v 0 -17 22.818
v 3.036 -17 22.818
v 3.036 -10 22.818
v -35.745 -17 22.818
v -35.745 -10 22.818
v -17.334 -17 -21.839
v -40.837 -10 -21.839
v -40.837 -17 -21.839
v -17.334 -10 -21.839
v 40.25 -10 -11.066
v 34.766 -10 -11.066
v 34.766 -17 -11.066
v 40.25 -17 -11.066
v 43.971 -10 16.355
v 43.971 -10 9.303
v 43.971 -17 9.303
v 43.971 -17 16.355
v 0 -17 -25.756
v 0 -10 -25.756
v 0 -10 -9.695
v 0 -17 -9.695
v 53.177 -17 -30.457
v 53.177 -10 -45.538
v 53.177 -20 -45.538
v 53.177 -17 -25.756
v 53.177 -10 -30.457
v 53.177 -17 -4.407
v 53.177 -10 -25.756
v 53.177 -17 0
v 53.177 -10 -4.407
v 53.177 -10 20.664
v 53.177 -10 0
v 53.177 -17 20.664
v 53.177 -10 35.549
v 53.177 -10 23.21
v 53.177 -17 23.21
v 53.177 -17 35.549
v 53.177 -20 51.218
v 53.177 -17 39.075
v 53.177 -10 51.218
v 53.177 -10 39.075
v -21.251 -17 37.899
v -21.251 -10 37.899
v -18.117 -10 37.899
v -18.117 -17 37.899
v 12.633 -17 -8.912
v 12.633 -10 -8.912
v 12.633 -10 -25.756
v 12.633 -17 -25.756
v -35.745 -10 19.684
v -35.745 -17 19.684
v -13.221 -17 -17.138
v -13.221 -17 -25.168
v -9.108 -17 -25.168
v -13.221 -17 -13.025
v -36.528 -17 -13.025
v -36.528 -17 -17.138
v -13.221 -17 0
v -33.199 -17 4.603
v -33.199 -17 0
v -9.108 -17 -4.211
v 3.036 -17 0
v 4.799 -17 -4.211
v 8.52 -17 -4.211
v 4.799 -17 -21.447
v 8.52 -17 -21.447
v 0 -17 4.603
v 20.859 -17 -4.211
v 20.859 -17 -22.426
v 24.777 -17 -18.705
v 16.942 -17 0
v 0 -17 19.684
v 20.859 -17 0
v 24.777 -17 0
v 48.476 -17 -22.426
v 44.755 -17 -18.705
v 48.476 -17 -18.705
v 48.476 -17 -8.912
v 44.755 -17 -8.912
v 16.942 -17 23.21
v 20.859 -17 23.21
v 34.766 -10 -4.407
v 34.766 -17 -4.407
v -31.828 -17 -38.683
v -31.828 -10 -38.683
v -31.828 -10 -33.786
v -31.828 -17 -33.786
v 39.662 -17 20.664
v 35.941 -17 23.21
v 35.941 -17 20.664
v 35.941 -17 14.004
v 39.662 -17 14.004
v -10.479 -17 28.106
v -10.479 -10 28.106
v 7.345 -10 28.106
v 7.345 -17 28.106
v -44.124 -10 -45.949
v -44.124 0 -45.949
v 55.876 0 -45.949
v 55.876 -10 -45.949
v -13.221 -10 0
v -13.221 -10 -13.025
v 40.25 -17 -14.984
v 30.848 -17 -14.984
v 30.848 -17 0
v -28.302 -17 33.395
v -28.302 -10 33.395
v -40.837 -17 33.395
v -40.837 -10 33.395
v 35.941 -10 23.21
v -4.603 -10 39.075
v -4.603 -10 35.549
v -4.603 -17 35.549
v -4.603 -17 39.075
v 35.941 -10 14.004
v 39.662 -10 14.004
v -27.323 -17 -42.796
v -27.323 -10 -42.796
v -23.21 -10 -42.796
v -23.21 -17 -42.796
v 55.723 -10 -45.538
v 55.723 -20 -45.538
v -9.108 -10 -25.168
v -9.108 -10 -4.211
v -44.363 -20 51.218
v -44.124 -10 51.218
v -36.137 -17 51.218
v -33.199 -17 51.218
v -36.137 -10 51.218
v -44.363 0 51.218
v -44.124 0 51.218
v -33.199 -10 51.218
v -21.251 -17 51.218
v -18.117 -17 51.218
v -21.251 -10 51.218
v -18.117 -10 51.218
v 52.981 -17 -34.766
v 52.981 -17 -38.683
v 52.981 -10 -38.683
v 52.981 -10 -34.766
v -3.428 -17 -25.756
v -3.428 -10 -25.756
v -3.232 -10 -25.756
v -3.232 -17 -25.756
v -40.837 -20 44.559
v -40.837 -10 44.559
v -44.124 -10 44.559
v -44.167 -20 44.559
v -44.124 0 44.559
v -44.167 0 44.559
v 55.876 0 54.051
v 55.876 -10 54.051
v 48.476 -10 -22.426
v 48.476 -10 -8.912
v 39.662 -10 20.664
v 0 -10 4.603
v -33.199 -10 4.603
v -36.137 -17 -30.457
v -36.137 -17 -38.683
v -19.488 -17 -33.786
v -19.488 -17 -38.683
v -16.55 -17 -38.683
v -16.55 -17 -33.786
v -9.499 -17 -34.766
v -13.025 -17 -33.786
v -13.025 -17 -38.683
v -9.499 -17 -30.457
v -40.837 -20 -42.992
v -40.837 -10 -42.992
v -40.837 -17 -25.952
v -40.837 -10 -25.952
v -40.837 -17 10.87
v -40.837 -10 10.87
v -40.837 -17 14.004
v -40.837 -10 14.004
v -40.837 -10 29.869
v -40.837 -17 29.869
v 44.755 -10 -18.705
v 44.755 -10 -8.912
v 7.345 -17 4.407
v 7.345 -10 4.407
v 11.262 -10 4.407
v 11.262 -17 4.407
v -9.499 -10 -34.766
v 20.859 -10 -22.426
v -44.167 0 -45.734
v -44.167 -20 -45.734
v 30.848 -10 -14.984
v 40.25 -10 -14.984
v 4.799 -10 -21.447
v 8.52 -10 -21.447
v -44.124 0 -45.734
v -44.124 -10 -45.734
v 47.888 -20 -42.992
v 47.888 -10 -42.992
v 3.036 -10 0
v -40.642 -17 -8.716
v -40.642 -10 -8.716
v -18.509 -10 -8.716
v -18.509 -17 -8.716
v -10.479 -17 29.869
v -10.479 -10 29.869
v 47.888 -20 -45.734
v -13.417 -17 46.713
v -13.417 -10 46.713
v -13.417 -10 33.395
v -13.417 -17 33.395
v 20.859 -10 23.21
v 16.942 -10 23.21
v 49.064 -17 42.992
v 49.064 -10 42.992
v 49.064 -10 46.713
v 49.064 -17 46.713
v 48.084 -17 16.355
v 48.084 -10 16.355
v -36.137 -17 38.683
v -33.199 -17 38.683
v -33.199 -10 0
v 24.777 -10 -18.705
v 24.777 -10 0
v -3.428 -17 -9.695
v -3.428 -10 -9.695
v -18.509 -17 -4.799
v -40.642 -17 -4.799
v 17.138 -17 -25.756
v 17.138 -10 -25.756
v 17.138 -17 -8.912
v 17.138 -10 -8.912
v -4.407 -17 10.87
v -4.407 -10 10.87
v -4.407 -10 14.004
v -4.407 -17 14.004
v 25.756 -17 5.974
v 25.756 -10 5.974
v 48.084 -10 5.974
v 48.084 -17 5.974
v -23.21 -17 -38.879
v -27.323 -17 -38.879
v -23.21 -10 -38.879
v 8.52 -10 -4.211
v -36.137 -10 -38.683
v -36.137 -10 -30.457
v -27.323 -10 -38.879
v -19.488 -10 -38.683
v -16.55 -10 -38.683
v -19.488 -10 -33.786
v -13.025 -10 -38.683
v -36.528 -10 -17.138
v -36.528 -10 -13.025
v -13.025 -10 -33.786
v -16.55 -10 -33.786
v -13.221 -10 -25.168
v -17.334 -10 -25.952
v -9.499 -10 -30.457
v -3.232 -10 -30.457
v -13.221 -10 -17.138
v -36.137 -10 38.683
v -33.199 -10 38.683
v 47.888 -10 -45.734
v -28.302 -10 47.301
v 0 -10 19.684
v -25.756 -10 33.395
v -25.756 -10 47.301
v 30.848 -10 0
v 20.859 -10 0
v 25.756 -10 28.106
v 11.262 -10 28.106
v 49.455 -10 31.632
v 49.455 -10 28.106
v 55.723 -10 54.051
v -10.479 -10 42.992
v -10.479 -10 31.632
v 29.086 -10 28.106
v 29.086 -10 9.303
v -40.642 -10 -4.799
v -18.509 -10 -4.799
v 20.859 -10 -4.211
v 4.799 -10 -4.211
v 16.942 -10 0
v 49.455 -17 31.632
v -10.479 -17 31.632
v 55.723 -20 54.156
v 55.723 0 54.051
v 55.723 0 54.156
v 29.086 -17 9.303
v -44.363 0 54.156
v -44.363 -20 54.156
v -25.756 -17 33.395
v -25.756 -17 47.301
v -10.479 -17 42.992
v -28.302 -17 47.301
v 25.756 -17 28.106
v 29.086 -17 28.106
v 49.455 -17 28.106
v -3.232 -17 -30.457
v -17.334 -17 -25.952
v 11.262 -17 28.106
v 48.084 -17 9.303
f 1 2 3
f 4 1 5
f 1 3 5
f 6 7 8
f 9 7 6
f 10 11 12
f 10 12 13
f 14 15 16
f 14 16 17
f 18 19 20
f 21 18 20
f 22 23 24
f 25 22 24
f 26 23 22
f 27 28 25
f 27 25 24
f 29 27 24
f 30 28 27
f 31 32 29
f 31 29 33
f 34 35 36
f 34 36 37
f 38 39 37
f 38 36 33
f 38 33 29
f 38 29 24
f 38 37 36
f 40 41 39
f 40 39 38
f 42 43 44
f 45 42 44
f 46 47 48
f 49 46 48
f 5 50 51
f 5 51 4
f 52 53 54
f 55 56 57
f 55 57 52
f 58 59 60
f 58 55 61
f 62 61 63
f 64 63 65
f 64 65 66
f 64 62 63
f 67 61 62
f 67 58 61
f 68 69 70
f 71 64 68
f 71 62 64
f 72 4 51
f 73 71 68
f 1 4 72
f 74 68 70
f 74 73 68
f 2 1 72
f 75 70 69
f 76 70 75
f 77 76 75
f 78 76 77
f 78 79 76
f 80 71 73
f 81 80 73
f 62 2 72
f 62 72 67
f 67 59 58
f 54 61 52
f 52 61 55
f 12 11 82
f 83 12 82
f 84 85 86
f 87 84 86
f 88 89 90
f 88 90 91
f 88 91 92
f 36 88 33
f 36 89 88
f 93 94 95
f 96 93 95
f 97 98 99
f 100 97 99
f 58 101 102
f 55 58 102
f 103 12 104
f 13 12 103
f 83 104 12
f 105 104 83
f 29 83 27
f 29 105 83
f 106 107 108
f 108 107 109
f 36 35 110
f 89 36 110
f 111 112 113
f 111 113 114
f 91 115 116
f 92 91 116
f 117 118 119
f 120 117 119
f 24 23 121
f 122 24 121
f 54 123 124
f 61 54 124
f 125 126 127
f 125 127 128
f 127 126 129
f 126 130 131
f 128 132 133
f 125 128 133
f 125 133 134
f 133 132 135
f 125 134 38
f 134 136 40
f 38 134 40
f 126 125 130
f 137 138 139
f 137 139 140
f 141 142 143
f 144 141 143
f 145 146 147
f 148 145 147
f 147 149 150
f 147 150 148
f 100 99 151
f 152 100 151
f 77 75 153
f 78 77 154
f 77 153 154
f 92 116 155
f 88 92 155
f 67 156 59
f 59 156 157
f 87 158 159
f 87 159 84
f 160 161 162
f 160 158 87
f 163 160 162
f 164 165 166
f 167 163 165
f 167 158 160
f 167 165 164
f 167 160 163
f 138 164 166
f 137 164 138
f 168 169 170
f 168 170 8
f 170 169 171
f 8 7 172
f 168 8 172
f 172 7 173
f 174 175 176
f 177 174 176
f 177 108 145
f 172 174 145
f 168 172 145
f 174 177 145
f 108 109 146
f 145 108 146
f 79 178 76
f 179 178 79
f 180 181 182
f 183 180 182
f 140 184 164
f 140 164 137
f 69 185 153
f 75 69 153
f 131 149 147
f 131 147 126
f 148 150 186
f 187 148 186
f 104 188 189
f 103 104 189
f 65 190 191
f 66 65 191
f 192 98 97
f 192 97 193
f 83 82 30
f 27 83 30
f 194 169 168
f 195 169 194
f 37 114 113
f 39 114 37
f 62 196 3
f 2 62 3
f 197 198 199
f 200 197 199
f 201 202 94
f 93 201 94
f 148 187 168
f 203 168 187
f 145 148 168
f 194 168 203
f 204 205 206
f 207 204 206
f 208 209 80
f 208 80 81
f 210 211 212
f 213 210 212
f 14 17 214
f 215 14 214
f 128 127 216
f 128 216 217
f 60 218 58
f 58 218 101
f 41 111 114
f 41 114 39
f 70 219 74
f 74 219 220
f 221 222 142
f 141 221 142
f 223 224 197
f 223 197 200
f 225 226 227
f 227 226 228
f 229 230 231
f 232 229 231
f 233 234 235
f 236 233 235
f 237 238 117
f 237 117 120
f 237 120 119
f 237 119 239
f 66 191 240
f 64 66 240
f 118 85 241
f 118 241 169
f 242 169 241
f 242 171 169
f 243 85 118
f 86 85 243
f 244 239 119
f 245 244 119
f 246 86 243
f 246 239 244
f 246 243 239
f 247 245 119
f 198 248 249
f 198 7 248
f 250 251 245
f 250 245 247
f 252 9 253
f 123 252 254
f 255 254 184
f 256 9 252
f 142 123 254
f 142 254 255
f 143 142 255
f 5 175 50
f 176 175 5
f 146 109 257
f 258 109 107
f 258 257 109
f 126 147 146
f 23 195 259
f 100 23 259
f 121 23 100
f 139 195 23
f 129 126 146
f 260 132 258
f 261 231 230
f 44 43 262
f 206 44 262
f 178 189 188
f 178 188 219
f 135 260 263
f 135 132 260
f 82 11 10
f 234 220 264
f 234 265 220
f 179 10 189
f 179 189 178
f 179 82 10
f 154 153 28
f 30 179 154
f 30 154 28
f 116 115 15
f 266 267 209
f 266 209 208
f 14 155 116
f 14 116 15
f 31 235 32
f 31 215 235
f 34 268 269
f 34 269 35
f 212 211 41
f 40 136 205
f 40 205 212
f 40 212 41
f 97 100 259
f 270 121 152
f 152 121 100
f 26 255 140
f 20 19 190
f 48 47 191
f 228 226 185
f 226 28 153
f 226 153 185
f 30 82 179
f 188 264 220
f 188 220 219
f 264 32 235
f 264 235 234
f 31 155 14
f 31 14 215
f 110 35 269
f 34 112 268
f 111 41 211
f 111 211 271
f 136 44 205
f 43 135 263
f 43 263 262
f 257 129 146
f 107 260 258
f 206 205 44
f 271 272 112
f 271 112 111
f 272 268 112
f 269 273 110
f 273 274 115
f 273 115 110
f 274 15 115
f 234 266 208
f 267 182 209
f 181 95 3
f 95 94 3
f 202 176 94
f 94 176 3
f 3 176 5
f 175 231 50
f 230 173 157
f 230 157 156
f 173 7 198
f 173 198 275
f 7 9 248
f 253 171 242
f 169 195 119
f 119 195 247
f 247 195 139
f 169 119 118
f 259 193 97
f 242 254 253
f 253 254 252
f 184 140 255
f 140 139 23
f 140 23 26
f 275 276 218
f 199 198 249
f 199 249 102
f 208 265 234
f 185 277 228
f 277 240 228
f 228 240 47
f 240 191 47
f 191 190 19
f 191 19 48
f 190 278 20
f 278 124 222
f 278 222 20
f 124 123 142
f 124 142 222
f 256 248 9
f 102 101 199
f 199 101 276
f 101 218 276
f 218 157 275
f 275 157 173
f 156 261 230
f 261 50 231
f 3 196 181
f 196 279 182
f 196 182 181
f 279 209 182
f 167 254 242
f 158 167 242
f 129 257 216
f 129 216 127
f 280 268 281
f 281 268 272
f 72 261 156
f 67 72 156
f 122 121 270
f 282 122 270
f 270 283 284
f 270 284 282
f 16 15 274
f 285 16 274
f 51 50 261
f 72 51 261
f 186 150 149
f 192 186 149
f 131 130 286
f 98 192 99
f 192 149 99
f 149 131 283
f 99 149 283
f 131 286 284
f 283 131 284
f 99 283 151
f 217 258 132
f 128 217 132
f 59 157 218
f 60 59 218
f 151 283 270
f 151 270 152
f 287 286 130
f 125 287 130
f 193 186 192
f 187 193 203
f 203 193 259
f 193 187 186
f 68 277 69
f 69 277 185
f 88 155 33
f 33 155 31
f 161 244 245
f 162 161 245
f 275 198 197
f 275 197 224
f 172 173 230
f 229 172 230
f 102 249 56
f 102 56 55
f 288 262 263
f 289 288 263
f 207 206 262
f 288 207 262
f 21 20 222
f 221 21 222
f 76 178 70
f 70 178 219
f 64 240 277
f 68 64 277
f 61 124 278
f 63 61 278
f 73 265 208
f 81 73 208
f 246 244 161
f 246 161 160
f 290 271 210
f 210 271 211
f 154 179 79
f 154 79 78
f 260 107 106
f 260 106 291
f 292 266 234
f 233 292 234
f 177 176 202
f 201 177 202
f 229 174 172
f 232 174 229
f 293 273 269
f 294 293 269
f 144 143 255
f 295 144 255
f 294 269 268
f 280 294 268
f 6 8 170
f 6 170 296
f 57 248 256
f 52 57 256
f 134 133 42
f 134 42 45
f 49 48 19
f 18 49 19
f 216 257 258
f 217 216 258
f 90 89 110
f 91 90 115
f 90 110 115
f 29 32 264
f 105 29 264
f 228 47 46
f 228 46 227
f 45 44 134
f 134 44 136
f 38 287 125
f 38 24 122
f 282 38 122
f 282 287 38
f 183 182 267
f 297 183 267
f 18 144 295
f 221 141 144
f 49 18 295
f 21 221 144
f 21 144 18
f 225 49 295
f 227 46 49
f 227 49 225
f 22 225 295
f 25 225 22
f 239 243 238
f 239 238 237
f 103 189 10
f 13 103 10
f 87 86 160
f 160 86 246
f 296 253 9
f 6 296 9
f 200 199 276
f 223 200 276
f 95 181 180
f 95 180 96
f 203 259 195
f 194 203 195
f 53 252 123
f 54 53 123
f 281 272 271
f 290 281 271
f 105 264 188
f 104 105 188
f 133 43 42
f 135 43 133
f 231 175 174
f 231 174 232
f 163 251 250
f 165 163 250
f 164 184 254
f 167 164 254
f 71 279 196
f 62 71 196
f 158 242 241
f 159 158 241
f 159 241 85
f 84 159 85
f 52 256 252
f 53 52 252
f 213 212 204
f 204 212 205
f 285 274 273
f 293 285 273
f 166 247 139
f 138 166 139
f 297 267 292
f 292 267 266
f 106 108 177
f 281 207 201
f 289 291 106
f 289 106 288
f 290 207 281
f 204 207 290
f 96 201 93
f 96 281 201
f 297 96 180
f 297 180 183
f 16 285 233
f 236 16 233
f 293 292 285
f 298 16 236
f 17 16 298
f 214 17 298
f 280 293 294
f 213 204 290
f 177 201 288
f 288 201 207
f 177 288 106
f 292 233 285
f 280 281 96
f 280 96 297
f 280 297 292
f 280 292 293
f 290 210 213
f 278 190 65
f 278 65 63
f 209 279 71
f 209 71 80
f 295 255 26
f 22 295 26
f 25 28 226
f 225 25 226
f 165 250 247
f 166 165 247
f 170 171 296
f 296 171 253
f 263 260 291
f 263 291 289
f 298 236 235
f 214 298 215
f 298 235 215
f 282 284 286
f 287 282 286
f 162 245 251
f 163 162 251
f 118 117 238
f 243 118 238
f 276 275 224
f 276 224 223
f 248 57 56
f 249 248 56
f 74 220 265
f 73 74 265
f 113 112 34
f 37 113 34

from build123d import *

# Parameters (mm, degrees)
F0_W     = 100
F0_H     = 100
F3_DEPTH = 10
F1_W     = 2.5462172925
F1_H     = 96.7562794685
F1_W_2   = 88.7259021401
F1_H_2   = 2.7420781553
F4_DEPTH = 20
F2_W     = 2.9379464686
F2_H     = 12.5352256
F2_W_2   = 2.5462172925
F2_H_2   = 13.9062739909
F2_W_3   = 3.9172582328
F2_H_3   = 23.699412588
F2_W_4   = 59.5423225313
F2_H_4   = 3.7213973701
F2_W_5   = 4.1131153703
F2_H_5   = 7.0510646328
F2_W_6   = 3.1338073313
F2_H_6   = 13.3186765015
F2_W_7   = 57.7795598656
F2_H_7   = 3.5255327821
F2_W_8   = 3.7213899195
F2_H_8   = 6.6593382508
F2_W_9   = 5.4841600358
F2_H_9   = 3.9172582328
F2_H_10  = 23.2097543776
F2_H_11  = 9.7931455821
F2_W_10  = 3.7213945761
F2_H_12  = 17.2359370627
F2_W_11  = 35.7449837029
F2_H_13  = 3.1338054687
F2_W_12  = 23.3076885343
F2_H_14  = 4.1131218895
F2_W_13  = 4.504846409
F2_H_15  = 16.8442111462
F2_W_14  = 62.480266206
F2_W_15  = 2.9379427433
F2_H_16  = 4.8965737224
F2_W_16  = 4.3089836836
F2_W_17  = 36.4305013791
F2_H_17  = 3.1338064
F2_W_18  = 22.1325084567
F2_W_19  = 23.503549397
F2_H_18  = 4.1131190956
F2_W_20  = 4.1131209582
F5_DEPTH = 17


with BuildPart() as f3:
    # F0 (on Front) → F3 (new body)
    with BuildSketch(Plane.XZ):
        with Locations((5.8758892119, 4.0513307203)):
            Rectangle(F0_W, F0_H)
    extrude(amount=F3_DEPTH)

    # F1 (on face) → F4 (join)
    with BuildSketch(Plane.XZ):
        Polygon((55.7230003178, 54.1560947895), (-44.3629510701, 54.1560947895), (-44.3629510701, 51.2181520462), (53.1767830253, 51.2181520462), (55.7230003178, 51.2181520462), align=None)
        with Locations((54.4498916715, 2.8400123119)):
            Rectangle(F1_W, F1_H)
        Polygon((-44.167086482, 44.5588119328), (-44.167086482, -45.7339882851), (-40.837418288, -45.7339882851), (-40.837418288, -42.9919101298), (-40.837418288, 44.5588119328), align=None)
        with Locations((3.5255327821, -44.3629492074)):
            Rectangle(F1_W_2, F1_H_2)
    extrude(amount=F4_DEPTH)

    # F2 (on face) → F5 (join)
    with BuildSketch(Plane.XZ):
        with Locations((-34.6677359194, 44.9505392462)):
            Rectangle(F2_W, F2_H)
        Polygon((-40.837418288, 33.3946235478), (-40.837418288, 29.869094491), (-10.4786660522, 29.869094491), (-10.4786660522, 31.6318590194), (-10.4786660522, 33.3946235478), (-13.4166097268, 33.3946235478), (-25.7559735328, 33.3946235478), (-28.3021908253, 33.3946235478), align=None)
        Polygon((-10.4786660522, 31.6318590194), (-10.4786660522, 29.869094491), (-10.4786660522, 28.1063281), (7.3448577896, 28.1063281), (11.2621160224, 28.1063281), (25.7559753954, 28.1063281), (29.0856454521, 28.1063281), (49.4553856552, 28.1063281), (49.4553856552, 31.6318590194), align=None)
        with Locations((-27.0290821791, 40.3477605432)):
            Rectangle(F2_W_2, F2_H_2)
        Polygon((-13.4166097268, 33.3946235478), (-10.4786660522, 33.3946235478), (-10.4786660522, 42.9919101298), (-10.4786660522, 46.7133074999), (-13.4166097268, 46.7133074999), align=None)
        with Locations((9.303486906, 16.256621806)):
            Rectangle(F2_W_3, F2_H_3)
        with Locations((19.2924952134, 44.8526088148)):
            Rectangle(F2_W_4, F2_H_4)
        Polygon((29.0856454521, 9.3034887686), (29.0856454521, 28.1063281), (25.7559753954, 28.1063281), (25.7559753954, 5.9738187119), (29.0856454521, 5.9738187119), align=None)
        Polygon((43.9712256193, 9.3034887686), (29.0856454521, 9.3034887686), (29.0856454521, 5.9738187119), (48.0843409896, 5.9738187119), (48.0843409896, 9.3034887686), align=None)
        with Locations((46.0277833045, 12.8290210851)):
            Rectangle(F2_W_5, F2_H_5)
        with Locations((-19.6842234582, 44.5588137954)):
            Rectangle(F2_W_6, F2_H_6)
        with Locations((24.2870030925, 37.3118855059)):
            Rectangle(F2_W_7, F2_H_7)
        Polygon((53.372643888, 20.6635370851), (53.372643888, 23.2097543776), (35.9408482909, 23.2097543776), (35.9408482909, 20.6635370851), (39.6622382104, 20.6635370851), align=None)
        with Locations((37.8015432507, 17.3338679597)):
            Rectangle(F2_W_8, F2_H_8)
        Polygon((53.372643888, -4.4069155119), (53.372643888, 0), (30.8484081179, 0), (30.8484081179, -4.4069155119), (34.7656644881, -4.4069155119), align=None)
        Polygon((34.7656644881, -4.4069155119), (30.8484081179, -4.4069155119), (30.8484081179, -14.9835133925), (34.7656644881, -14.9835133925), (34.7656644881, -11.0662551597), align=None)
        with Locations((37.507744506, -13.0248842761)):
            Rectangle(F2_W_9, F2_H_9)
        Polygon((24.7766599059, -18.7049079686), (24.7766599059, 0), (20.8594016731, 0), (20.8594016731, -4.2110527866), (20.8594016731, -22.4263034761), (24.7766599059, -22.4263034761), align=None)
        Polygon((20.8594016731, -4.2110527866), (20.8594016731, 0), (16.9421434402, 0), (3.0358759686, 0), (0, 0), (0, -4.2110527866), (4.7986414284, -4.2110527866), (8.5200360045, -4.2110527866), align=None)
        with Locations((18.9007725567, 11.6048771888)):
            Rectangle(F2_W_3, F2_H_10)
        Polygon((44.7546802461, -18.7049079686), (24.7766599059, -18.7049079686), (24.7766599059, -22.4263034761), (48.4760701656, -22.4263034761), (48.4760701656, -18.7049079686), align=None)
        with Locations((46.6153752059, -13.8083351776)):
            Rectangle(F2_W_8, F2_H_11)
        with Locations((6.6593387164, -12.8290213179)):
            Rectangle(F2_W_10, F2_H_12)
        Polygon((0, 0), (3.0358759686, 0), (3.0358759686, 22.8180289268), (0, 22.8180289268), (0, 19.6842234582), (0, 4.6027782373), align=None)
        Polygon((-13.2207460701, 0), (0, 0), (0, 4.6027782373), (-33.1987626851, 4.6027782373), (-33.1987626851, 0), align=None)
        Polygon((0, -4.2110527866), (0, 0), (-13.2207460701, 0), (-13.2207460701, -4.2110527866), (-9.1076260433, -4.2110527866), align=None)
        with Locations((-17.8724918514, 21.2511261925)):
            Rectangle(F2_W_11, F2_H_13)
        Polygon((-9.1076260433, -25.168383494), (-9.1076260433, -4.2110527866), (-13.2207460701, -4.2110527866), (-13.2207460701, -13.0248842761), (-13.2207460701, -17.1380061656), (-13.2207460701, -25.168383494), align=None)
        with Locations((-24.8745903373, -15.0814452209)):
            Rectangle(F2_W_12, F2_H_14)
        Polygon((53.1767830253, -30.4566826671), (53.1767830253, -25.7559735328), (17.138004303, -25.7559735328), (12.633157894, -25.7559735328), (12.633157894, -30.4566826671), align=None)
        with Locations((14.8855810985, -17.3338679597)):
            Rectangle(F2_W_13, F2_H_15)
        Polygon((12.633157894, -30.4566826671), (12.633157894, -25.7559735328), (0, -25.7559735328), (-3.2317389268, -25.7559735328), (-3.2317389268, -30.4566826671), align=None)
        Polygon((-3.2317389268, -25.7559735328), (0, -25.7559735328), (0, -9.6952142194), (-3.4276025835, -9.6952142194), (-3.4276025835, -25.7559735328), align=None)
        Polygon((-9.499351494, -30.4566826671), (-13.0248842761, -30.4566826671), (-13.0248842761, -33.7863527238), (-13.0248842761, -38.6829264462), (-9.499351494, -38.6829264462), (-9.499351494, -34.7656682134), align=None)
        Polygon((-13.0248842761, -33.7863527238), (-13.0248842761, -30.4566826671), (-36.1367091537, -30.4566826671), (-36.1367091537, -33.7863527238), (-31.8277254701, -33.7863527238), (-19.4883588701, -33.7863527238), (-16.5504161268, -33.7863527238), align=None)
        with Locations((21.740781609, -36.7242973298)):
            Rectangle(F2_W_14, F2_H_9)
        with Locations((-18.0193874985, -36.234639585)):
            Rectangle(F2_W_15, F2_H_16)
        with Locations((-33.9822173119, -36.234639585)):
            Rectangle(F2_W_16, F2_H_16)
        with Locations((-22.6221675985, 12.4372956343)):
            Rectangle(F2_W_17, F2_H_17)
        with Locations((-29.5752994716, -6.7572705448)):
            Rectangle(F2_W_18, F2_H_9)
        with Locations((-29.0856435895, -23.8952748477)):
            Rectangle(F2_W_19, F2_H_18)
        with Locations((-25.2663167194, -40.8374201506)):
            Rectangle(F2_W_20, F2_H_9)
    extrude(amount=F5_DEPTH)


solid = f3.part
